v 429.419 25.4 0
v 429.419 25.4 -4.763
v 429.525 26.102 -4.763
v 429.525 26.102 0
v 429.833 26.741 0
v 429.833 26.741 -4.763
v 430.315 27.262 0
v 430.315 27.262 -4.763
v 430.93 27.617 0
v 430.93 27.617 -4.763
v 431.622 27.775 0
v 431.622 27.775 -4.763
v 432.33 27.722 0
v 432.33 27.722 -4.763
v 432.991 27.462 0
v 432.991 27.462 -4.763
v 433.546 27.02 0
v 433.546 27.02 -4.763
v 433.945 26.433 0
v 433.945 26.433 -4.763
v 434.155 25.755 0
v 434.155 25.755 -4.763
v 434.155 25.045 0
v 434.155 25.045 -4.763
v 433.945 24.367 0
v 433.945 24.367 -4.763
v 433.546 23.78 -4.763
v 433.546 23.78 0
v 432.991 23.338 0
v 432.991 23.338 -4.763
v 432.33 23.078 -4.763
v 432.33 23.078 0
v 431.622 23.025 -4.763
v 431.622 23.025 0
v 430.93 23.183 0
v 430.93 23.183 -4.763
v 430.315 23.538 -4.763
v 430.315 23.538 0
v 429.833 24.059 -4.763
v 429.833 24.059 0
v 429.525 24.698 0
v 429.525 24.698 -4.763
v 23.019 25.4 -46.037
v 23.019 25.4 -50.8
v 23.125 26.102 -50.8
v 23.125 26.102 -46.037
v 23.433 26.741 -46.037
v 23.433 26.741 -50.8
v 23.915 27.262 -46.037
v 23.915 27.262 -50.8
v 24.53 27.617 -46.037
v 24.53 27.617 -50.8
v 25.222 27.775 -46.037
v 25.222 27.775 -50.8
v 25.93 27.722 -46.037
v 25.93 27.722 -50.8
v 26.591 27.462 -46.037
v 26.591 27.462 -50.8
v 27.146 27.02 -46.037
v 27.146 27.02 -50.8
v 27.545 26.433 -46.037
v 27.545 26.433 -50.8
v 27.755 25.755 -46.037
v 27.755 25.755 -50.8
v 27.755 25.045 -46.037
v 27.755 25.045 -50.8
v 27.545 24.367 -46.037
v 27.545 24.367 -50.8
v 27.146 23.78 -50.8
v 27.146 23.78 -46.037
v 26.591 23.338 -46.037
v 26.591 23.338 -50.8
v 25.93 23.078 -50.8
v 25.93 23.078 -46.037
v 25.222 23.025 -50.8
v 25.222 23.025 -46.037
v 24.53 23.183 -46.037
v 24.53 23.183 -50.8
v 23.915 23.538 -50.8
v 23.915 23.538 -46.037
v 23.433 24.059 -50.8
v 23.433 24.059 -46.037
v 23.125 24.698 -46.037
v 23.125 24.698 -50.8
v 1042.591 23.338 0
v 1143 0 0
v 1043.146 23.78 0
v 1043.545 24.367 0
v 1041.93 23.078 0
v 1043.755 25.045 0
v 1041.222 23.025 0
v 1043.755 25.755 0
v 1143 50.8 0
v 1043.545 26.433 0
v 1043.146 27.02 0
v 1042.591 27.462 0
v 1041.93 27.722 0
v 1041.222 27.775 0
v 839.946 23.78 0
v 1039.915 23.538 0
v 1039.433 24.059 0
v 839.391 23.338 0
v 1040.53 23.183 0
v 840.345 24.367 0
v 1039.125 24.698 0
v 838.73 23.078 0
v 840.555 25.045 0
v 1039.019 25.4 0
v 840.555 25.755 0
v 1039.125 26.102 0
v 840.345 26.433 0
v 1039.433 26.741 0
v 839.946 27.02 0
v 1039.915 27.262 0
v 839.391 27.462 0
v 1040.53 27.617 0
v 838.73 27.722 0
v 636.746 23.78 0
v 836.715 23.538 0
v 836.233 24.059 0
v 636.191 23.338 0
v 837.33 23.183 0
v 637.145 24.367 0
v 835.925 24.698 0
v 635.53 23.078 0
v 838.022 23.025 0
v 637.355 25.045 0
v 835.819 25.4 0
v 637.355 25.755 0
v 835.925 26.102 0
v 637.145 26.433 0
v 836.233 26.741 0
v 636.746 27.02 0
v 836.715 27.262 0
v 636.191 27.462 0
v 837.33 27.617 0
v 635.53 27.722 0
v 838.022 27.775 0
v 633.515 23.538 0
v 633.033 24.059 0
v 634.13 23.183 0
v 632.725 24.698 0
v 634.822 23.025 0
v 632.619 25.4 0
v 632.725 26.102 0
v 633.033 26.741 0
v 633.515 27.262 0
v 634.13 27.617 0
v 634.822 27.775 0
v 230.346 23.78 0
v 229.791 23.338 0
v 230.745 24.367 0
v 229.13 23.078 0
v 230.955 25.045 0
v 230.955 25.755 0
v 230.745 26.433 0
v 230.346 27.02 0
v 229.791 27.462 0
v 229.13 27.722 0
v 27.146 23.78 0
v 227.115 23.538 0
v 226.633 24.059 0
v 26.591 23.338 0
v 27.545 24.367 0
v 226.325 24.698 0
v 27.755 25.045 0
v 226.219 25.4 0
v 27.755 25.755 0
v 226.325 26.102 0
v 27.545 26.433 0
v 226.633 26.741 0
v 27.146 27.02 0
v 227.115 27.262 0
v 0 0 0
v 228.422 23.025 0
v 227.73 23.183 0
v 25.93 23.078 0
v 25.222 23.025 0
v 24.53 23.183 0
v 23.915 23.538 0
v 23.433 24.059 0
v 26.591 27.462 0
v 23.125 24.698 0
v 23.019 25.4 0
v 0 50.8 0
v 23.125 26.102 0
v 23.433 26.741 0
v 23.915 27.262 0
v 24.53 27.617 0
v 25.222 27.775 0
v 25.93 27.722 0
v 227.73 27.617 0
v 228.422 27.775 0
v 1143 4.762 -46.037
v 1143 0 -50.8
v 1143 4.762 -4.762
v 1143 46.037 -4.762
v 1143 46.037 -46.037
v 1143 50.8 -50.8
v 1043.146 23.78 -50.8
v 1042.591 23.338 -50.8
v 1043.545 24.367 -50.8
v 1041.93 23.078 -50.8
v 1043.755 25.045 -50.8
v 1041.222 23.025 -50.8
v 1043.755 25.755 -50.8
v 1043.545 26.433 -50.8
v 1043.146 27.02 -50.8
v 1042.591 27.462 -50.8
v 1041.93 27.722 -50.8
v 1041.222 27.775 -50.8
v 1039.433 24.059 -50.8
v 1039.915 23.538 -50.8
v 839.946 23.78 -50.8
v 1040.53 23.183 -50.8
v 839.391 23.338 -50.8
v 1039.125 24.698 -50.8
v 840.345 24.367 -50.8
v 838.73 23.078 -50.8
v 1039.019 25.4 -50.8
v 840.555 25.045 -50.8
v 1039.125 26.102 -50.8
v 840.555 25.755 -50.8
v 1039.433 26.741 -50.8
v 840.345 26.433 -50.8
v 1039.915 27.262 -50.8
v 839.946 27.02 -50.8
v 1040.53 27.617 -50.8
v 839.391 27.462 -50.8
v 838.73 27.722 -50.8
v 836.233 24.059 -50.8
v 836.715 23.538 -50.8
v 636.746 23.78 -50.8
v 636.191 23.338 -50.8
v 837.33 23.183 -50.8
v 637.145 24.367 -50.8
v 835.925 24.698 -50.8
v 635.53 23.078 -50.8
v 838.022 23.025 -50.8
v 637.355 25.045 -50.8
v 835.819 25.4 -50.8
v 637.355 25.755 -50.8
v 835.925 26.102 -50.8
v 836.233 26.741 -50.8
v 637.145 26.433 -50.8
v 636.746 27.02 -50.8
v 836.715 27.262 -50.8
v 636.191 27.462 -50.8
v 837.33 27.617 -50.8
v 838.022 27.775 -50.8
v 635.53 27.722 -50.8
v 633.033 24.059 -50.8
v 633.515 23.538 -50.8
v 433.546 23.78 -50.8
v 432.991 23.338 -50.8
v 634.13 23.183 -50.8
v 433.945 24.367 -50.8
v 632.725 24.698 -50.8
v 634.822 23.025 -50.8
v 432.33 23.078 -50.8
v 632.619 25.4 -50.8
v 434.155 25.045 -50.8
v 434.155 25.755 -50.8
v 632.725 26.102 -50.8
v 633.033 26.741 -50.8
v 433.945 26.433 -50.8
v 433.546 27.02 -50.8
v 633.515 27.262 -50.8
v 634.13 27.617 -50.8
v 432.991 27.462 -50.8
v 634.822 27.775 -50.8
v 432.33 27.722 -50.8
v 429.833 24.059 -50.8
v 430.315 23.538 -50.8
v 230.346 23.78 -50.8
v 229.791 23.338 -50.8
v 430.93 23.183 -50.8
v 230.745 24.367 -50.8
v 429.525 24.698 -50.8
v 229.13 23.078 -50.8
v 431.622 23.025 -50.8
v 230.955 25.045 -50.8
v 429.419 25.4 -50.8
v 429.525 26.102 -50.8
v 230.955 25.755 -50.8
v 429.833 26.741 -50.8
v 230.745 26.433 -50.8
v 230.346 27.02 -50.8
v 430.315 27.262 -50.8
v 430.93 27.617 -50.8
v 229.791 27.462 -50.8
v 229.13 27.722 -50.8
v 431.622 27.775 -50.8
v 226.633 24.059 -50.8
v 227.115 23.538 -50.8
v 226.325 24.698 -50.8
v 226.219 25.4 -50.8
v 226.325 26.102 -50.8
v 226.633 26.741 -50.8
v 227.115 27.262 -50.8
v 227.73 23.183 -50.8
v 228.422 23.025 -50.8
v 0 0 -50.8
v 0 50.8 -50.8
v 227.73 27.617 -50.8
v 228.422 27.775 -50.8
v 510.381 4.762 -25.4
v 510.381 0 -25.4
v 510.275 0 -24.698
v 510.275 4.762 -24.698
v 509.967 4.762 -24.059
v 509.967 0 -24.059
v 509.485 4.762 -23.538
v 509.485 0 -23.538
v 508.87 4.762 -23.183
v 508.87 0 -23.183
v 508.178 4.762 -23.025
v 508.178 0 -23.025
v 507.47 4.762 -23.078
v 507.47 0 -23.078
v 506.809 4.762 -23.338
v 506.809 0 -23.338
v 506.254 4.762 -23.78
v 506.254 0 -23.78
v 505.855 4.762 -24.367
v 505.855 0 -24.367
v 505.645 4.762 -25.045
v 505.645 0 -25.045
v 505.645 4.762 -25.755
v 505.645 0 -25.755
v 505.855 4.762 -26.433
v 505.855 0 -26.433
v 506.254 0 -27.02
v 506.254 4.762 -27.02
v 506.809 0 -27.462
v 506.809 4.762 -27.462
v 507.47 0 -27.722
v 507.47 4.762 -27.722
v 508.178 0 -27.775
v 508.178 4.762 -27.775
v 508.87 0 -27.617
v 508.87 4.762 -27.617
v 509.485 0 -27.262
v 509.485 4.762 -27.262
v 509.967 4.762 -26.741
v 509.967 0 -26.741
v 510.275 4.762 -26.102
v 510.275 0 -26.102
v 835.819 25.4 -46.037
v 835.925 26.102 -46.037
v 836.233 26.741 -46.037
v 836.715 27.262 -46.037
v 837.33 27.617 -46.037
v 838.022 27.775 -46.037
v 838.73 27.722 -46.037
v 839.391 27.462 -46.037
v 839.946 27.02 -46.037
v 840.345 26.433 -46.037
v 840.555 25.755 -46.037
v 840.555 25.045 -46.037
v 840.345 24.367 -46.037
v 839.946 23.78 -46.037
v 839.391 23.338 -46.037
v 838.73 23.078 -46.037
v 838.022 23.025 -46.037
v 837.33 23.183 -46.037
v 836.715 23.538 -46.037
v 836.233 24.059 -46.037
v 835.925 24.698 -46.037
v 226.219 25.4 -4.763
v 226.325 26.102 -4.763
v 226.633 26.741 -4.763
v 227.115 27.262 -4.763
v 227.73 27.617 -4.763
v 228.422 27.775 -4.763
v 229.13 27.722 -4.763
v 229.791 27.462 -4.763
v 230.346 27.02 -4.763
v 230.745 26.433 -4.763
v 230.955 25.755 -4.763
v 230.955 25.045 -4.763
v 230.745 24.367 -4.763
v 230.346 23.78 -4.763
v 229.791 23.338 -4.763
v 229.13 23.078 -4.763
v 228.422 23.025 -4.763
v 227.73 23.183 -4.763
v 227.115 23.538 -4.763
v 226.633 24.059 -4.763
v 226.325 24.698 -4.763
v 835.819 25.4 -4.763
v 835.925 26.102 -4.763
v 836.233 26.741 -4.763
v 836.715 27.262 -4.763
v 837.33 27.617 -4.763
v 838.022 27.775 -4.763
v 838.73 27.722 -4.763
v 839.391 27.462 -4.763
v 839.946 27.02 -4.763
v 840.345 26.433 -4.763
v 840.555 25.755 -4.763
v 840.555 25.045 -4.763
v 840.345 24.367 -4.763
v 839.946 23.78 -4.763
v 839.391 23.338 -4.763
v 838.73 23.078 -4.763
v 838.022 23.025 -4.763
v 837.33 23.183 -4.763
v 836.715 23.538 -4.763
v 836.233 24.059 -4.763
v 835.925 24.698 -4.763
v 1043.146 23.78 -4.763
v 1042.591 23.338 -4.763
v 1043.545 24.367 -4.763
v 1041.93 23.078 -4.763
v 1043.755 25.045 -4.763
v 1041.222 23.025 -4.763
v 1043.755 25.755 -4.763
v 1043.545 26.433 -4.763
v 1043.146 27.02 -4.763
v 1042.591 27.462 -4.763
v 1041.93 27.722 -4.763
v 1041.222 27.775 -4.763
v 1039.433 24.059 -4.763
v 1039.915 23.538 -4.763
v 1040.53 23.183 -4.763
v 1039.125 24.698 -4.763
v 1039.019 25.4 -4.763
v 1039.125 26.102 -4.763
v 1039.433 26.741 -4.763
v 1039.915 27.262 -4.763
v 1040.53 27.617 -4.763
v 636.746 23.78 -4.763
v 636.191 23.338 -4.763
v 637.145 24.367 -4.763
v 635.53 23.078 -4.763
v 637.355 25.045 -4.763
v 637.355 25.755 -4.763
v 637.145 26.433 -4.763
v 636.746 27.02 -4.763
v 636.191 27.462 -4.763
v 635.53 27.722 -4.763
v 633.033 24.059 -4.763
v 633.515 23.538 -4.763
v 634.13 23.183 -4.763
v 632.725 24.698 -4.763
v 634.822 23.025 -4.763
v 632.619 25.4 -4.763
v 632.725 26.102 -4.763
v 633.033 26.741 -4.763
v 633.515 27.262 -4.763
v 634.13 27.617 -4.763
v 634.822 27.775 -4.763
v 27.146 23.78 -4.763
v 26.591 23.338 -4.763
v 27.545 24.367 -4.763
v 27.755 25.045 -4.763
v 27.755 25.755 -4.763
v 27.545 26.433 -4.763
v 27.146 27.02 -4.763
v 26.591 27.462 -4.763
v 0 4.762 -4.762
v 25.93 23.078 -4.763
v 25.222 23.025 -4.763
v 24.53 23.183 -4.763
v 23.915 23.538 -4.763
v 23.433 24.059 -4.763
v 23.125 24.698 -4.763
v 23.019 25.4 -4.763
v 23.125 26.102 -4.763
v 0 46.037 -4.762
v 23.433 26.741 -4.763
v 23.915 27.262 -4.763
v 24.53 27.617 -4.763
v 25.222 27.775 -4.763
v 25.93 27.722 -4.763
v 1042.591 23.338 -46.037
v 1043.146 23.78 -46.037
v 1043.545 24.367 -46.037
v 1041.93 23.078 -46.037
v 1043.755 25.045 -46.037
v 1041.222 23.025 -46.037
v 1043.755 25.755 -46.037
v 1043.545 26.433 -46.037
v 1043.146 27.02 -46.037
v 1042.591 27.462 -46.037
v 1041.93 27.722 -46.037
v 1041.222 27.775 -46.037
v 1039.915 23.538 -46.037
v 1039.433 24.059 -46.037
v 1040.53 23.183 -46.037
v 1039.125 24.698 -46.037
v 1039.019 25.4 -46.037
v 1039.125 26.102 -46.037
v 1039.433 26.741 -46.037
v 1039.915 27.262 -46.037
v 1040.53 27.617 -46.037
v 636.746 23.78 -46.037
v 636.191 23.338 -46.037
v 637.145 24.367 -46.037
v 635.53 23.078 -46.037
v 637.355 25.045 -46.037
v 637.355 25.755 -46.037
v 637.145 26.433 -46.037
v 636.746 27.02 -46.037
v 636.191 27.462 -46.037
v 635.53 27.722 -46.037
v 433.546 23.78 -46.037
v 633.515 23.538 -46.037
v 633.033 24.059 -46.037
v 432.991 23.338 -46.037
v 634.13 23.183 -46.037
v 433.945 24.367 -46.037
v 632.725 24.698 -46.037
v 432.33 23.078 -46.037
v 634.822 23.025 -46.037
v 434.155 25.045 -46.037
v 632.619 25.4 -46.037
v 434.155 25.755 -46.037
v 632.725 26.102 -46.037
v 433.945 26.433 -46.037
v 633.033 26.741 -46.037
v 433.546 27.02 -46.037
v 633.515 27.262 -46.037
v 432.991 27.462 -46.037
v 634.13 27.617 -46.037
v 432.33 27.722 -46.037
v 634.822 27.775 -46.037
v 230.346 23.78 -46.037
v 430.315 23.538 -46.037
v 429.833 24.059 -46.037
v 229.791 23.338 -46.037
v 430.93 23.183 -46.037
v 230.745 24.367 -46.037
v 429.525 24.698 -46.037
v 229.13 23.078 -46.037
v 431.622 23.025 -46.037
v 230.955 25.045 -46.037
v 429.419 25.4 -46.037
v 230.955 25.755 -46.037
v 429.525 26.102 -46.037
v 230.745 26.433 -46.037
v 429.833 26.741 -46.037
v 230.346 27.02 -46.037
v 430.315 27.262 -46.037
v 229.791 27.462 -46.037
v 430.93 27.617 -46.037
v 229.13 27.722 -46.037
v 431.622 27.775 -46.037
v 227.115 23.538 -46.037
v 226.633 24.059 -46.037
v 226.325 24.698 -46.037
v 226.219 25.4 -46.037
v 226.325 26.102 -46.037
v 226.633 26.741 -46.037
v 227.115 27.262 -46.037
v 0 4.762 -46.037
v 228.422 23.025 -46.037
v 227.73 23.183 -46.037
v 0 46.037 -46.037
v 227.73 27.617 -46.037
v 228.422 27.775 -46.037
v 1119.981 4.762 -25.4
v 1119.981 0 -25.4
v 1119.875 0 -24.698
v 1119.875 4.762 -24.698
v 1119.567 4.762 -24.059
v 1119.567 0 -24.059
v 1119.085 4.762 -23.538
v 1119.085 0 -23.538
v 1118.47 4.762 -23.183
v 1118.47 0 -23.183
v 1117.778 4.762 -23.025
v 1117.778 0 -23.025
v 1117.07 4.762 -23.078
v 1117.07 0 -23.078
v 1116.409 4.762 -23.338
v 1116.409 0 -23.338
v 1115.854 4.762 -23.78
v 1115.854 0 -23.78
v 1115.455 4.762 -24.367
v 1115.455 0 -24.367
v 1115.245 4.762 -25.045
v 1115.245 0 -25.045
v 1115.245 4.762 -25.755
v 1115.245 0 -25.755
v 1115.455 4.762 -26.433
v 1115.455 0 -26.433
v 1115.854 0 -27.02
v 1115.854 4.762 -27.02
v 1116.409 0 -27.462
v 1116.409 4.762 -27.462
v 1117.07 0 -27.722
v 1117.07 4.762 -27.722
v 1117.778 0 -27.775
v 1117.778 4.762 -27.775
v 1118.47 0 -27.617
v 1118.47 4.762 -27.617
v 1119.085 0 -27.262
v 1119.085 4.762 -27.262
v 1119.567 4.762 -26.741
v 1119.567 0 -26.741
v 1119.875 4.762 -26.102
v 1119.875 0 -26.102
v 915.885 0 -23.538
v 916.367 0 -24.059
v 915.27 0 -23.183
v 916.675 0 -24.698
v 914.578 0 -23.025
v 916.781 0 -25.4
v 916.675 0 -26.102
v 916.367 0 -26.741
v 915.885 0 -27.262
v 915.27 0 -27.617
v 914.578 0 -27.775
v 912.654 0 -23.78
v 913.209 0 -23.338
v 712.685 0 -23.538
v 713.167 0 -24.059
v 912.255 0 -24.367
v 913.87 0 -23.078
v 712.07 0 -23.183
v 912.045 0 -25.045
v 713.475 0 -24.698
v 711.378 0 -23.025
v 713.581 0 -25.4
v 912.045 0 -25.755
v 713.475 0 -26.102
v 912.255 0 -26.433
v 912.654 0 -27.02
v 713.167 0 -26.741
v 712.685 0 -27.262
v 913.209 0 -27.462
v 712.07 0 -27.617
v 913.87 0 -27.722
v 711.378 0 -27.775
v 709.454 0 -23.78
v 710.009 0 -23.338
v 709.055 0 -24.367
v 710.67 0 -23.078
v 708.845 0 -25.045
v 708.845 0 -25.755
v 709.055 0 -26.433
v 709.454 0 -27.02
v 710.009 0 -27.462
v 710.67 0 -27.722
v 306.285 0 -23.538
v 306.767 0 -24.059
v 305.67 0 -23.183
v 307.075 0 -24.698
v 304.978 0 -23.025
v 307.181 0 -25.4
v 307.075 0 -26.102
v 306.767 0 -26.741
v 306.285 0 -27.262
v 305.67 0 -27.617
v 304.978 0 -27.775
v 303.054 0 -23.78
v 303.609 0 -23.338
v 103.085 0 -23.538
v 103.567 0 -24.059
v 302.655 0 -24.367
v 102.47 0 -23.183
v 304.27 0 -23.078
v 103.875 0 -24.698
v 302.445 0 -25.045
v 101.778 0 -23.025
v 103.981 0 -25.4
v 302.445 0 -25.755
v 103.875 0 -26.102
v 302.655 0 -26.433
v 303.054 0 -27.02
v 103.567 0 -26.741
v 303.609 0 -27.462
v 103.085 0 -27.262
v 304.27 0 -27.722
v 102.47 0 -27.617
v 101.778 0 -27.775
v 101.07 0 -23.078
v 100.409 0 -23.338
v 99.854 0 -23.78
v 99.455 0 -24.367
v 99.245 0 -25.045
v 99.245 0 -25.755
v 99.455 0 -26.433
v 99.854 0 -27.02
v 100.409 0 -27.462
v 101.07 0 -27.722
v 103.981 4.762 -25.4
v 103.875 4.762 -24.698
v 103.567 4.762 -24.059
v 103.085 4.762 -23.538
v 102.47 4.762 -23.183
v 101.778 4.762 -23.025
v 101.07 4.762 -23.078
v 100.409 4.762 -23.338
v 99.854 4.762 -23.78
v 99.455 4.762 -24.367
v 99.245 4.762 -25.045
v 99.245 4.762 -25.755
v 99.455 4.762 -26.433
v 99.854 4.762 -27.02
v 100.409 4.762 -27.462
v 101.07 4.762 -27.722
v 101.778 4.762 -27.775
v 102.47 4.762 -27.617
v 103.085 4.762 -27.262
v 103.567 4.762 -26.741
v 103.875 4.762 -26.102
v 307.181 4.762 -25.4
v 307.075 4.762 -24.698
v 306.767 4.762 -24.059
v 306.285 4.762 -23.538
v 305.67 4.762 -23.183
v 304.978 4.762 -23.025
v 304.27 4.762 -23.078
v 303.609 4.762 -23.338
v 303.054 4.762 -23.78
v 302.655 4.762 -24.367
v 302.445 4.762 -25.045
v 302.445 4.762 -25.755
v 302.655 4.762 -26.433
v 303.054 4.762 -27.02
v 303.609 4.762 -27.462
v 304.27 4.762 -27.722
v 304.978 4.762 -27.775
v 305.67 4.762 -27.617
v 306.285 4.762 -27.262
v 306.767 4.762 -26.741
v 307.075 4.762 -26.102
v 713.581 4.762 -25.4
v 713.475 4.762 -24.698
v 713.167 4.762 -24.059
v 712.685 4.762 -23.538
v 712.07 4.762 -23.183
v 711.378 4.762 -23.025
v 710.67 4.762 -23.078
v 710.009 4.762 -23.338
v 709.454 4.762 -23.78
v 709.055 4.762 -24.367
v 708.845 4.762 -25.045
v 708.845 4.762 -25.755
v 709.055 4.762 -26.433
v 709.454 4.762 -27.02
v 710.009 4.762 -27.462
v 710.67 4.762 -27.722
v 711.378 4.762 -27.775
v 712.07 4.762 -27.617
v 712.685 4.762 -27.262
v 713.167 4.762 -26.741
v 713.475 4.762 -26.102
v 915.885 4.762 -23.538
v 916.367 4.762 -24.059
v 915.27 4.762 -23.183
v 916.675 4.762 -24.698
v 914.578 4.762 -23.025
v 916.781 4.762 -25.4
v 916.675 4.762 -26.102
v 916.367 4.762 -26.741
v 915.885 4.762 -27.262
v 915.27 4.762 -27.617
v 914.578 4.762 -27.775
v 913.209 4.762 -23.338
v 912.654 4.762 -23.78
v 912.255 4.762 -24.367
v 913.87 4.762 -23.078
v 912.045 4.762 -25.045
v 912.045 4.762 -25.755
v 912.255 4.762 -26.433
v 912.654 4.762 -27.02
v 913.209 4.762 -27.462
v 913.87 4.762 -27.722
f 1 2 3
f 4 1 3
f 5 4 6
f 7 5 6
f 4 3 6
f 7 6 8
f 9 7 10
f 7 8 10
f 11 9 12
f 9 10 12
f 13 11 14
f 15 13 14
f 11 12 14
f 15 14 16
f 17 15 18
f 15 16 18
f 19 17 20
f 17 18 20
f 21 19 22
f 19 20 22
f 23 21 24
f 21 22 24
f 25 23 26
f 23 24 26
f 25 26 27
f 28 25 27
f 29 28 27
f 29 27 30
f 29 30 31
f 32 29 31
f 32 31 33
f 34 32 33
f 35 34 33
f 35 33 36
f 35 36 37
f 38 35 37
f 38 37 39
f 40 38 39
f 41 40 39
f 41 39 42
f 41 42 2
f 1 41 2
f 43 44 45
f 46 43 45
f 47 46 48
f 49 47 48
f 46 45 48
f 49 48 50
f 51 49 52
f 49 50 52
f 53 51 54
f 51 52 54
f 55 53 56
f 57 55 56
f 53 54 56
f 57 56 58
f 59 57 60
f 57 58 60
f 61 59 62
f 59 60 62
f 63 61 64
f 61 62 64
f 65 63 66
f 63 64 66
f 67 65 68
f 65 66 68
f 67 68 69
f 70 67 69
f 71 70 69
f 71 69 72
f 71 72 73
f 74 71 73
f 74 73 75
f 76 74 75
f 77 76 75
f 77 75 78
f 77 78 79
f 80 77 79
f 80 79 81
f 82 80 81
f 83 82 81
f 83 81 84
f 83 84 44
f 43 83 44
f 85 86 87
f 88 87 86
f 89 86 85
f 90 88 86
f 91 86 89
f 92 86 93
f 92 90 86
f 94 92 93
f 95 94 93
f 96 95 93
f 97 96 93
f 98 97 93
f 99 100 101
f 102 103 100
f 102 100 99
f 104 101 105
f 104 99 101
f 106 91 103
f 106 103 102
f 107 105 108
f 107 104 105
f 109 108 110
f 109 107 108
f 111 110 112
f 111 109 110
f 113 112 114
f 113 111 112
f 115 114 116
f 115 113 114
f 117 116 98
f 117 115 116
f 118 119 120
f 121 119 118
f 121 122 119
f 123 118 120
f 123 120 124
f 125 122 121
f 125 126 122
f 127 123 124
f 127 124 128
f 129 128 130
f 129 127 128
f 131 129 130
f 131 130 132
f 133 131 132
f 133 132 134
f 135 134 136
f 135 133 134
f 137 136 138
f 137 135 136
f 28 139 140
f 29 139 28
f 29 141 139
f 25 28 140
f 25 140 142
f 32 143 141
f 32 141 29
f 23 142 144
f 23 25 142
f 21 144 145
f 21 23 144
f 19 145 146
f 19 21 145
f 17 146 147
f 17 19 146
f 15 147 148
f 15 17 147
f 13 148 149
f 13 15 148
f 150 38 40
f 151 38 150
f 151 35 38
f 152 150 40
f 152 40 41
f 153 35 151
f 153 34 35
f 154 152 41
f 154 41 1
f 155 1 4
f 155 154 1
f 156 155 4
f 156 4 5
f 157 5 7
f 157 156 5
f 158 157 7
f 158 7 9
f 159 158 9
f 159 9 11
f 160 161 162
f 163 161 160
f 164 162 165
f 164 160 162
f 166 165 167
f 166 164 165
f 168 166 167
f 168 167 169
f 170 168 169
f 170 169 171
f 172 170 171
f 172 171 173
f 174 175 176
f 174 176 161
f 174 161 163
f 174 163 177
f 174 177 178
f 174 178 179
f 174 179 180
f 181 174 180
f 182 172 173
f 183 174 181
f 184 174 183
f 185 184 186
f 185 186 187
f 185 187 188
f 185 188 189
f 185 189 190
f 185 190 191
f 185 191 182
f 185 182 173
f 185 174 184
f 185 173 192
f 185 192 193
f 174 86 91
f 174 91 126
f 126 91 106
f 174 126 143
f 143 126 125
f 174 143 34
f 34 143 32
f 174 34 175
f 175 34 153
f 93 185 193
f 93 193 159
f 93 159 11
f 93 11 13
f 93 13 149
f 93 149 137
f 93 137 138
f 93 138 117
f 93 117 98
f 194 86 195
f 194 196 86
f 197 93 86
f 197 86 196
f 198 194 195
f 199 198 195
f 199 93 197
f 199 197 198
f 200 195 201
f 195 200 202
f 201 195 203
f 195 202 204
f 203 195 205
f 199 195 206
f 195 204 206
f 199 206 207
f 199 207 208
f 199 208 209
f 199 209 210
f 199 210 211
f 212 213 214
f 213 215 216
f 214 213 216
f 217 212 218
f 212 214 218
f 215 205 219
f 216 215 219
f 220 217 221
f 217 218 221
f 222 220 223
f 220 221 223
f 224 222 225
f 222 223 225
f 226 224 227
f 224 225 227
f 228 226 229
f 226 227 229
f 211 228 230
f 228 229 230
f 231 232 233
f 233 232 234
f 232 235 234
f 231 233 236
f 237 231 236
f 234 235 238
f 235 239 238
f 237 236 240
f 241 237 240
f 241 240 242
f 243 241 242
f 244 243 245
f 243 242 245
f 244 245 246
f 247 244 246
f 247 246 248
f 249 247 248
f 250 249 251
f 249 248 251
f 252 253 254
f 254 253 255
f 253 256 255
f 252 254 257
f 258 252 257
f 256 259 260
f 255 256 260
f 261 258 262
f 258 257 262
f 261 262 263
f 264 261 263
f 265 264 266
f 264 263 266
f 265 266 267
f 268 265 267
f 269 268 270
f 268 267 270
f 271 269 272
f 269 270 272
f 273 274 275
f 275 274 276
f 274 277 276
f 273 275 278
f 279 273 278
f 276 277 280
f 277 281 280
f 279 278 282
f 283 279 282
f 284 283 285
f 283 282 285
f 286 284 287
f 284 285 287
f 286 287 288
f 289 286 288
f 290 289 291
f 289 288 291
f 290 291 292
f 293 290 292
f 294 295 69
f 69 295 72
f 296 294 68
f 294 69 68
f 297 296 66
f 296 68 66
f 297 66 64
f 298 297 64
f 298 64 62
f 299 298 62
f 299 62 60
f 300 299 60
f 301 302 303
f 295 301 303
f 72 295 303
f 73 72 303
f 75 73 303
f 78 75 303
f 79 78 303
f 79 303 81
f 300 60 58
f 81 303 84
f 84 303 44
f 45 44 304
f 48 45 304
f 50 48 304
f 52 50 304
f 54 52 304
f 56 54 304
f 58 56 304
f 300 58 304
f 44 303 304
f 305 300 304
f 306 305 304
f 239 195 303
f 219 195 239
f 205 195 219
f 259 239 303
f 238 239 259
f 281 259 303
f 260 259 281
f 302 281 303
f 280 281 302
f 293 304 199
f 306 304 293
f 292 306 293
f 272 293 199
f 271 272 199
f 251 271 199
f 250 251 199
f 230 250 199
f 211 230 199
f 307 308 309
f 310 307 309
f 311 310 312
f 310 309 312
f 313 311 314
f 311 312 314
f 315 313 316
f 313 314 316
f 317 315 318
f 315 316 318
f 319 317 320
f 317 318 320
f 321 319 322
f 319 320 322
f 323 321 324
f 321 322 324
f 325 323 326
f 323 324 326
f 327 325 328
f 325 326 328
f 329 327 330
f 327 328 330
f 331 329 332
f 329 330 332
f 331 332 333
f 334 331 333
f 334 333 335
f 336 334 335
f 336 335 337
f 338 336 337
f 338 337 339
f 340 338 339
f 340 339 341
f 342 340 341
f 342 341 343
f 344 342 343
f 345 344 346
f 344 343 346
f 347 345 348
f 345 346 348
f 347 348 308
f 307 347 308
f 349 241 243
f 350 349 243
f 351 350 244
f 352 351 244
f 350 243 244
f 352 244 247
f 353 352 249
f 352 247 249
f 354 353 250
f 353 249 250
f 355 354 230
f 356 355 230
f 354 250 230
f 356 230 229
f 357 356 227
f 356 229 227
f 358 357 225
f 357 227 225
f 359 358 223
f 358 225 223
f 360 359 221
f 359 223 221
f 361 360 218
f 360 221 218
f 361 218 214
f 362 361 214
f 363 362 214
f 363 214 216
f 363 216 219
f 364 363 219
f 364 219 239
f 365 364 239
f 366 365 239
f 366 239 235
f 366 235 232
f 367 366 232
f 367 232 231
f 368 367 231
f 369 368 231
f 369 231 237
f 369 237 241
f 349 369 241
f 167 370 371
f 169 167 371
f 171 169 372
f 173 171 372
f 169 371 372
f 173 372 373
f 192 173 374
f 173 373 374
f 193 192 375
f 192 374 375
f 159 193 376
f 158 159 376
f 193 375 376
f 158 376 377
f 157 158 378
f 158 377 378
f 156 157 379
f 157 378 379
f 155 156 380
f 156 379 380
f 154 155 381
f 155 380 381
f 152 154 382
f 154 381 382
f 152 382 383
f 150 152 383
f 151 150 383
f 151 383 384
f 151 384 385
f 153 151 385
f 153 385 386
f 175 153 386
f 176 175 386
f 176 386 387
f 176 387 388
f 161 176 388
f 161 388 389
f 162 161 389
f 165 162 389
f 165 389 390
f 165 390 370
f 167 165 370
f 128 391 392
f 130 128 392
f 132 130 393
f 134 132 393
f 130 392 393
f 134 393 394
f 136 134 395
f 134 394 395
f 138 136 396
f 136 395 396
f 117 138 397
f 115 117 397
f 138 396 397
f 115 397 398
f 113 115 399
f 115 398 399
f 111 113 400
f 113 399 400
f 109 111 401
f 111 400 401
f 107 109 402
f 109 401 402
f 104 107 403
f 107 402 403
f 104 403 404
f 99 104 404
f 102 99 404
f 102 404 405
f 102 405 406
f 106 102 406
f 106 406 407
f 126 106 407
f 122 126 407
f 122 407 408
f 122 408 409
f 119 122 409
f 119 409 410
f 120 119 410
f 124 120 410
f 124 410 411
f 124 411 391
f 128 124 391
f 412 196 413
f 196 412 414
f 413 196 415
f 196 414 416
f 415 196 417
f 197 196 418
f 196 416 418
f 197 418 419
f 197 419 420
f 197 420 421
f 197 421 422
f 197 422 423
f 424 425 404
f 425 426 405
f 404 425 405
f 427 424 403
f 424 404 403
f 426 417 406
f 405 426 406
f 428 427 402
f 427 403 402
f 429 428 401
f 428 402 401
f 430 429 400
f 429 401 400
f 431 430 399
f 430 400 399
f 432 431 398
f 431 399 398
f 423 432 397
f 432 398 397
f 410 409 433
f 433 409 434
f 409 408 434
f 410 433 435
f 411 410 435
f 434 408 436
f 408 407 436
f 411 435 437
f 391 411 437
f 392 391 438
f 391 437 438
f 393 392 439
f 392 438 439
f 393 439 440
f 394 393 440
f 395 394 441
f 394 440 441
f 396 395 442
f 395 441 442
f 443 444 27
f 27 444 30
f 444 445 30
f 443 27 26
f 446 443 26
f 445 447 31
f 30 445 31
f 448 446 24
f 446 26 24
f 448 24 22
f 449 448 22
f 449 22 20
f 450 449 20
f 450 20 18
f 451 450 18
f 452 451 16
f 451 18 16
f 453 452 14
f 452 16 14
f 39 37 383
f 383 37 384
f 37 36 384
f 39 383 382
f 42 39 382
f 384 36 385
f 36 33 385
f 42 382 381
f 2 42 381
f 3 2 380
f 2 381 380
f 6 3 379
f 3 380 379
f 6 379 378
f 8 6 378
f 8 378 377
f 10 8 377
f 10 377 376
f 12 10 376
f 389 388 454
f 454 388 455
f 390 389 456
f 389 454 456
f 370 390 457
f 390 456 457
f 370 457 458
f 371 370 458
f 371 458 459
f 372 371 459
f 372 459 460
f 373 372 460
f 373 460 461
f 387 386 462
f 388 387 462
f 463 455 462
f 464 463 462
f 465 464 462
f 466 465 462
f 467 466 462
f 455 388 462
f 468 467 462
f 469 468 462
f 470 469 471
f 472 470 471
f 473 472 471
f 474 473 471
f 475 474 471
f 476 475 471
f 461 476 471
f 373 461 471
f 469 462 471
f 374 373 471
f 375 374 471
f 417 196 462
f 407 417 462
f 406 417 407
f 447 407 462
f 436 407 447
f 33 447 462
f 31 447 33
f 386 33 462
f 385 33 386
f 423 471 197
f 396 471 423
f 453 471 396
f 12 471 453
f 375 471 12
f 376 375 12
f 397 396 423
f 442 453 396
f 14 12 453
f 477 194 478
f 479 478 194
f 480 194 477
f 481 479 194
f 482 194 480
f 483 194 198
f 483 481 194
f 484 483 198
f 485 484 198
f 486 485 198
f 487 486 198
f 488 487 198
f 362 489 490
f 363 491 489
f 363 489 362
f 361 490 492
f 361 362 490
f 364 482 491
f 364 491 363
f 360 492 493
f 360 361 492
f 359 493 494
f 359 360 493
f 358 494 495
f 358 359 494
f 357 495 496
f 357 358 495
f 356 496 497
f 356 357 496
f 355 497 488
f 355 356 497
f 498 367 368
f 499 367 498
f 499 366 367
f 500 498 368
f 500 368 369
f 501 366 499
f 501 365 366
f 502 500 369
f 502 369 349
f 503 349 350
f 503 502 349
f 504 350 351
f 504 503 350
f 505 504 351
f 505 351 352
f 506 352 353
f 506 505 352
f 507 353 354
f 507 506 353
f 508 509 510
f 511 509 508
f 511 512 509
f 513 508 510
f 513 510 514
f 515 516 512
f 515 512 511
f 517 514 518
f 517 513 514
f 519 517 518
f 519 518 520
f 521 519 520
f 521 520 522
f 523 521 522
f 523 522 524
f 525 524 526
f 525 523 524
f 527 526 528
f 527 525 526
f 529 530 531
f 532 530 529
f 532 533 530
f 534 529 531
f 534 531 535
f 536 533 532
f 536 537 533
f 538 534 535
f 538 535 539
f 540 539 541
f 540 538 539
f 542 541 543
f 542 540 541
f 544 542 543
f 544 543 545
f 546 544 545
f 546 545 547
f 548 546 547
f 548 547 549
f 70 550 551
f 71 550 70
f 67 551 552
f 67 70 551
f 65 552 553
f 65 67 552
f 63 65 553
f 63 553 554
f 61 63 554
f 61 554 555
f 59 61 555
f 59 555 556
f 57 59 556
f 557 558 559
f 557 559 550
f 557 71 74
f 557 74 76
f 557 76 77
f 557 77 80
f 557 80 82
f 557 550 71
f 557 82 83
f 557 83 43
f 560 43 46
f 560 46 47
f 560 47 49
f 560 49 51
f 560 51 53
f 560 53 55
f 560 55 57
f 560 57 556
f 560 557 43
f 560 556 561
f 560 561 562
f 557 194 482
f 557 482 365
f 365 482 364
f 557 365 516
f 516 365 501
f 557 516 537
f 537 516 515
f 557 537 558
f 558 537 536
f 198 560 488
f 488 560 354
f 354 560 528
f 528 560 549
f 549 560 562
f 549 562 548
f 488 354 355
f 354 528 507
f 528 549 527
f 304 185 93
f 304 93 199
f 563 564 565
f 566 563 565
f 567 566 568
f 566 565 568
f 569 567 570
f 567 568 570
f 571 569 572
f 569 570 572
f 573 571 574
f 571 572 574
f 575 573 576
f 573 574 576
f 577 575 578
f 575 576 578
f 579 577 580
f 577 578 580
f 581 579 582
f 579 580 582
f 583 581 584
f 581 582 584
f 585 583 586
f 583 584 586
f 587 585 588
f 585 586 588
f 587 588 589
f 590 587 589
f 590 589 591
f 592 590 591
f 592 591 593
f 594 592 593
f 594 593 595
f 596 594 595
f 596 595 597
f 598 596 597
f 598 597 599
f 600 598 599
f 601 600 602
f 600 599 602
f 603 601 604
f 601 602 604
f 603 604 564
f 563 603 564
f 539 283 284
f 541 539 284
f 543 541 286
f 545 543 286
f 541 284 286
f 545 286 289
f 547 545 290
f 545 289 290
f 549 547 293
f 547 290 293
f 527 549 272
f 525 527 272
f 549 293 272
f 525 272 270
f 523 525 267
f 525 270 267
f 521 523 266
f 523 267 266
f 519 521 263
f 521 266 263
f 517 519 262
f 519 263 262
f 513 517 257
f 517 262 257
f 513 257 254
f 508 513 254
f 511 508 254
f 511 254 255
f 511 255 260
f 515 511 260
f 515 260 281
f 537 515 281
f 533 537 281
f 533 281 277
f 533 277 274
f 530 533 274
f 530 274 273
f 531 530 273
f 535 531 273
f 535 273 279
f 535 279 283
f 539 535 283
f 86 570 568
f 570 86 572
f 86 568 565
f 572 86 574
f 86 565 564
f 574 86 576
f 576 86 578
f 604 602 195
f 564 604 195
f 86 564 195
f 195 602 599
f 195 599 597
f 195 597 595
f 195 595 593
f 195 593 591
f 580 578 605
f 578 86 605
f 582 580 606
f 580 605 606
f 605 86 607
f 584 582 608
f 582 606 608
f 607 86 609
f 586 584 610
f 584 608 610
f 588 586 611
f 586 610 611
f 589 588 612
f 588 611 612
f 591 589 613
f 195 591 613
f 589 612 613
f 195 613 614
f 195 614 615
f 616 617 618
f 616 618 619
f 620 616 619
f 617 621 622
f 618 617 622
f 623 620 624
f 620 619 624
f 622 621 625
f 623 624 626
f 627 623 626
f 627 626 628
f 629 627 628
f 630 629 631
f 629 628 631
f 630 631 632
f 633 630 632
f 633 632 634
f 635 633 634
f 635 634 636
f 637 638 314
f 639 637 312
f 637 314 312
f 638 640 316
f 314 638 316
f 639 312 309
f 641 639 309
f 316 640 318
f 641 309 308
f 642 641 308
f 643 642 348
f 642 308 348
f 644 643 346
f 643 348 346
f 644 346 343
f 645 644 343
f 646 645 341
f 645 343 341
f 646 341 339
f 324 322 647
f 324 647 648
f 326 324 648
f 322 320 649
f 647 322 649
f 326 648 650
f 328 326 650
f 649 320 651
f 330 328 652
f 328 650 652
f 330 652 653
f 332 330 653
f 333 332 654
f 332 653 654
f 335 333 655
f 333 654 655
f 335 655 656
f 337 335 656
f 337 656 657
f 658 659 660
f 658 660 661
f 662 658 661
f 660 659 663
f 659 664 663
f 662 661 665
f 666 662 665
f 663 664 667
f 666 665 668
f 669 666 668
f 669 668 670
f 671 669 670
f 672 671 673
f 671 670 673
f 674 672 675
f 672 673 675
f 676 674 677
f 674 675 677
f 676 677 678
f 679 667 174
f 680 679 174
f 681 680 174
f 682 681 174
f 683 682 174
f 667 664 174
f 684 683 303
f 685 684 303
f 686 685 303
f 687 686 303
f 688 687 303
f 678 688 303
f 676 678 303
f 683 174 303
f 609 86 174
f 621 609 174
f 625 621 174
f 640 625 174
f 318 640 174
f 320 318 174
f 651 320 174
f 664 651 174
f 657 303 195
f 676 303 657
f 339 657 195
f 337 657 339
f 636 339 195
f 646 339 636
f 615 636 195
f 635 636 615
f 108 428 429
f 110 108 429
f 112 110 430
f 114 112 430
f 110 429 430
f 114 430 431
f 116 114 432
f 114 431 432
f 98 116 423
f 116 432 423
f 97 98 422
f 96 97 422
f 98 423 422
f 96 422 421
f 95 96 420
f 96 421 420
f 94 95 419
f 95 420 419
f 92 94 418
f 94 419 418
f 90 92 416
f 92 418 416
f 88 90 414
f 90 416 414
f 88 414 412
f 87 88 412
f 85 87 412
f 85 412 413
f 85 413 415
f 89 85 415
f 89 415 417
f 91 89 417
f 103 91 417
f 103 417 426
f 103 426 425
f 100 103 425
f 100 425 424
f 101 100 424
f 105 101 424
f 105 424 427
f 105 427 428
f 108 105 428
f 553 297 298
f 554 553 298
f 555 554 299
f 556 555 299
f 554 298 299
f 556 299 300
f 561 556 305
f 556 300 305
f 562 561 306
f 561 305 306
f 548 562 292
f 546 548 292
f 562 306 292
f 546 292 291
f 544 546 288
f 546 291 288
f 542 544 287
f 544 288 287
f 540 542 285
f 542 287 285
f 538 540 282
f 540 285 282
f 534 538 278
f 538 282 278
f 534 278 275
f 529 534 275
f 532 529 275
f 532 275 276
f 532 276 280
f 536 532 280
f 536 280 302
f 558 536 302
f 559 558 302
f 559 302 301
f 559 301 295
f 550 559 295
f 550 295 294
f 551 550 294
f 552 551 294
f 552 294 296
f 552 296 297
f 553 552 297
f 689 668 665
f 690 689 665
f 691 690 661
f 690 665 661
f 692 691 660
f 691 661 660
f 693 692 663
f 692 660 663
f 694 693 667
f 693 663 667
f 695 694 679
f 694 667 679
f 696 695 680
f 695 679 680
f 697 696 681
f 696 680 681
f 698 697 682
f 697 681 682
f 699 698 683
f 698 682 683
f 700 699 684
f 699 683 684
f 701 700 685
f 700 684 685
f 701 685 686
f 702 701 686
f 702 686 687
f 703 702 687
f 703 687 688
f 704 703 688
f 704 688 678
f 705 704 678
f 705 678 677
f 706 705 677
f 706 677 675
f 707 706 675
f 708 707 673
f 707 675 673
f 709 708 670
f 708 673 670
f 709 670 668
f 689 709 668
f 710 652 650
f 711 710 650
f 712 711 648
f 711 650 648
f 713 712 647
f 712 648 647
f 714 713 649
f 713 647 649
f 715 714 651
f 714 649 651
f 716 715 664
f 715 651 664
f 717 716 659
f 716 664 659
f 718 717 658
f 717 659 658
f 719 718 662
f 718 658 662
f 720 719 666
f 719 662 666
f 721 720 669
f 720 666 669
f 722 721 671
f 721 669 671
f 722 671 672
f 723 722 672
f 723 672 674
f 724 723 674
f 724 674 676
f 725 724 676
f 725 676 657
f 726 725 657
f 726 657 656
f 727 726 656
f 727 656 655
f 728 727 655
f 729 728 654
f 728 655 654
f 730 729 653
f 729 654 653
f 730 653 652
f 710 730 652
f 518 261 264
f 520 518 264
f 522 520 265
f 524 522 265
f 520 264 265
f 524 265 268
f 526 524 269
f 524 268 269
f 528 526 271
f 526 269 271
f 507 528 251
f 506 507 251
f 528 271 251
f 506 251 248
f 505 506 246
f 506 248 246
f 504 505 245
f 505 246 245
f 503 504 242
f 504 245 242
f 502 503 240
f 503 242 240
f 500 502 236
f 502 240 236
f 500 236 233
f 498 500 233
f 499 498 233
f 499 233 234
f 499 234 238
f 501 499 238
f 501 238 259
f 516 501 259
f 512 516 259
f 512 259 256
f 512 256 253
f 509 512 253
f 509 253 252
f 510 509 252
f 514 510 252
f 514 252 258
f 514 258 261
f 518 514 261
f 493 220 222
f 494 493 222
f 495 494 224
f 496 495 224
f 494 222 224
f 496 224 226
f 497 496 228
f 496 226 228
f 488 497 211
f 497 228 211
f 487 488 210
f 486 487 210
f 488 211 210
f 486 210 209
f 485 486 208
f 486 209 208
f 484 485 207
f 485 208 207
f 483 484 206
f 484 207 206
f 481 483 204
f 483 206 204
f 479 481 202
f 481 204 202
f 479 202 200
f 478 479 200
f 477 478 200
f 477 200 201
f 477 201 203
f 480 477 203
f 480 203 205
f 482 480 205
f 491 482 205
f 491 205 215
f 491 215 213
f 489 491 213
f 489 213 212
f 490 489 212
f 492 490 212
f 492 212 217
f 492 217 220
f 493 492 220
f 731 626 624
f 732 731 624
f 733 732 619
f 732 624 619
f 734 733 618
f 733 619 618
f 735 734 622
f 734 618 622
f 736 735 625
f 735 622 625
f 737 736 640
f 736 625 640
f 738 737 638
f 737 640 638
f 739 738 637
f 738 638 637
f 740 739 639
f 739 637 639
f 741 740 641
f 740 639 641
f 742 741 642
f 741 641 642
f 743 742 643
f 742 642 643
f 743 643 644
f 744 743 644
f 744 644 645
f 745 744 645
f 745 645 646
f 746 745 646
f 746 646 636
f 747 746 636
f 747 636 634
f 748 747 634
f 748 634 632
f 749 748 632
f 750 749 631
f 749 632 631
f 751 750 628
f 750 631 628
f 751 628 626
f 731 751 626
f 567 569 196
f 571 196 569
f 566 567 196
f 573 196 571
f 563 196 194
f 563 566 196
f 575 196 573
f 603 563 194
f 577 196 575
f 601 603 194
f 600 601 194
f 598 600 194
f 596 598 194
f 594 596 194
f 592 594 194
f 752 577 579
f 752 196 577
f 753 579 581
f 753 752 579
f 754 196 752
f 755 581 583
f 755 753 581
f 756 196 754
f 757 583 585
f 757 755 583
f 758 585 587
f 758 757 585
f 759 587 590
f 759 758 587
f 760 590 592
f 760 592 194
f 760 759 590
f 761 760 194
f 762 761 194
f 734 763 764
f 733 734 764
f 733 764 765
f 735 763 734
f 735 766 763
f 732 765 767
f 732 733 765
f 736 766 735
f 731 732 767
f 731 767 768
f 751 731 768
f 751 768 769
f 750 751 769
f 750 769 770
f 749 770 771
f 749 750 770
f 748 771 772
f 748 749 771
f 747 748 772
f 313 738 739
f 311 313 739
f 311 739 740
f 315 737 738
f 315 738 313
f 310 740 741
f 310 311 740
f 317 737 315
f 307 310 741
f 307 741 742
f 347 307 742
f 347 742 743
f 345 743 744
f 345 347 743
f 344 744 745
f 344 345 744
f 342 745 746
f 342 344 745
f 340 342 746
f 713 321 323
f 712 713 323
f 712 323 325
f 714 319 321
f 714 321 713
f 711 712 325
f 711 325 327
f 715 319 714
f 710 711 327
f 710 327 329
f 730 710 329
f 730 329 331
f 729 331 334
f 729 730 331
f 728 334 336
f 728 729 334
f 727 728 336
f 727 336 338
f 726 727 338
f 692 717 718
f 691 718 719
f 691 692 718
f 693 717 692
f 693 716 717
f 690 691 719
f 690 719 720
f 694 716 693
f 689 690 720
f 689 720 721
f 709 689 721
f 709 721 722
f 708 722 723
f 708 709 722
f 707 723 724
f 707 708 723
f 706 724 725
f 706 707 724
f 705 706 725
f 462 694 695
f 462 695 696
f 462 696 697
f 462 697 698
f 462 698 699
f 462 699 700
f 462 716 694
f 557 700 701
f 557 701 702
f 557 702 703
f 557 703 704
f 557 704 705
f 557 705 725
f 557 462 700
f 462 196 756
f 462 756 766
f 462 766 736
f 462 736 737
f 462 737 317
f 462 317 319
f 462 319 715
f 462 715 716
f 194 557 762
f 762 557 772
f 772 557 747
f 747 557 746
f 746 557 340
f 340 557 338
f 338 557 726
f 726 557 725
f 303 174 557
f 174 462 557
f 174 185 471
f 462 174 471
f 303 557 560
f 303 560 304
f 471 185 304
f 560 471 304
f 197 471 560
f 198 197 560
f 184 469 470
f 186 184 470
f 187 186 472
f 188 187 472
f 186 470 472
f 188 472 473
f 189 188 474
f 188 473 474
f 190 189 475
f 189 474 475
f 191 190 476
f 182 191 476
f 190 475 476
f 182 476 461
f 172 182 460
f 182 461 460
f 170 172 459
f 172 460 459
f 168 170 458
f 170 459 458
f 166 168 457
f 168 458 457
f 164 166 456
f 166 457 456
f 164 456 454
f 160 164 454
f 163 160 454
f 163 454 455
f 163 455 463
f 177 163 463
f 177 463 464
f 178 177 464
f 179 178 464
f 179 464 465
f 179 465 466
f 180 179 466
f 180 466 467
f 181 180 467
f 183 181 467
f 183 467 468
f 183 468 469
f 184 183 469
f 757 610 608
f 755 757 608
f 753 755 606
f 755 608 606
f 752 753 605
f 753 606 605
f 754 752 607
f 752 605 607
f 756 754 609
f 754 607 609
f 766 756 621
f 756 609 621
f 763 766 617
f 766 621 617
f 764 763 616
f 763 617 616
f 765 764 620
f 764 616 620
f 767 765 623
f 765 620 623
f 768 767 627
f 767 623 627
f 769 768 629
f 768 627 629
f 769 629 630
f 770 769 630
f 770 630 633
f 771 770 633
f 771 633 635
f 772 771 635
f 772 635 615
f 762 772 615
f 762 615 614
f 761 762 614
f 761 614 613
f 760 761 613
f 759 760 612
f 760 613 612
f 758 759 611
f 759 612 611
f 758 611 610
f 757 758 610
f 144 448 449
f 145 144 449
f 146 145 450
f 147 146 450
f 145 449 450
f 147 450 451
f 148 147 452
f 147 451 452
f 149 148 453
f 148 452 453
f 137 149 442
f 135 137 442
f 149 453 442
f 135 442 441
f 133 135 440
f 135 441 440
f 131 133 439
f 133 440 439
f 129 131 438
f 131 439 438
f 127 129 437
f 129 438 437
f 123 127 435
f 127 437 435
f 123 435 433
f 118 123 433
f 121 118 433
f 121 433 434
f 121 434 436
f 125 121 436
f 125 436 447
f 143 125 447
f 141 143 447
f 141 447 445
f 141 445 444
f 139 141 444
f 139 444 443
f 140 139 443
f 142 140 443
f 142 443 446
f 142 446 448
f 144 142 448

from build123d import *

# Parameters (mm, degrees)
SKETCH1_W           = 50.8
SKETCH1_H           = 50.8
SKETCH1_W_2         = 41.275
SKETCH1_H_2         = 41.275
BOSS_EXTRUDE1_DEPTH = 1143
SKETCH2_R           = 2.38125
CUT_EXTRUDE1_DEPTH  = 51.8
LPATTERN1_COUNT     = 6
LPATTERN1_PITCH     = 203.2
SKETCH3_R           = 2.38125
CUT_EXTRUDE2_DEPTH  = 4.7625
LPATTERN2_COUNT     = 6
LPATTERN2_PITCH     = 203.2


with BuildPart() as part:
    # Sketch1 → Boss-Extrude1 (new body)
    with BuildSketch(Plane(origin=(0, 0, 0), x_dir=(0, 0, -1), z_dir=(1, 0, 0))):
        with Locations((25.4, 25.4)):
            Rectangle(SKETCH1_W, SKETCH1_H)
        with Locations((25.4, 25.4)):
            Rectangle(SKETCH1_W_2, SKETCH1_H_2, mode=Mode.SUBTRACT)
    extrude(amount=BOSS_EXTRUDE1_DEPTH)

    # Sketch2 → Cut-Extrude1 (cut, through all)
    with BuildSketch(Plane(origin=(0, 0, -50.8), x_dir=(-1, 0, 0), z_dir=(0, 0, -1))):
        with Locations((-1041.4, 25.4)):
            Circle(SKETCH2_R)
    cut_extrude1 = extrude(amount=-CUT_EXTRUDE1_DEPTH, mode=Mode.SUBTRACT)

    # LPattern1: Cut-Extrude1 ×6
    with Locations(*[(-i * LPATTERN1_PITCH, 0, 0) for i in range(1, LPATTERN1_COUNT)]):
        add(cut_extrude1, mode=Mode.SUBTRACT)

    # Sketch3 → Cut-Extrude2 (cut)
    with BuildSketch(Plane.XZ):
        with Locations((101.6, -25.4)):
            Circle(SKETCH3_R)
    cut_extrude2 = extrude(amount=-CUT_EXTRUDE2_DEPTH, mode=Mode.SUBTRACT)

    # LPattern2: Cut-Extrude2 ×6
    with Locations(*[(i * LPATTERN2_PITCH, 0, 0) for i in range(1, LPATTERN2_COUNT)]):
        add(cut_extrude2, mode=Mode.SUBTRACT)


solid = part.part
